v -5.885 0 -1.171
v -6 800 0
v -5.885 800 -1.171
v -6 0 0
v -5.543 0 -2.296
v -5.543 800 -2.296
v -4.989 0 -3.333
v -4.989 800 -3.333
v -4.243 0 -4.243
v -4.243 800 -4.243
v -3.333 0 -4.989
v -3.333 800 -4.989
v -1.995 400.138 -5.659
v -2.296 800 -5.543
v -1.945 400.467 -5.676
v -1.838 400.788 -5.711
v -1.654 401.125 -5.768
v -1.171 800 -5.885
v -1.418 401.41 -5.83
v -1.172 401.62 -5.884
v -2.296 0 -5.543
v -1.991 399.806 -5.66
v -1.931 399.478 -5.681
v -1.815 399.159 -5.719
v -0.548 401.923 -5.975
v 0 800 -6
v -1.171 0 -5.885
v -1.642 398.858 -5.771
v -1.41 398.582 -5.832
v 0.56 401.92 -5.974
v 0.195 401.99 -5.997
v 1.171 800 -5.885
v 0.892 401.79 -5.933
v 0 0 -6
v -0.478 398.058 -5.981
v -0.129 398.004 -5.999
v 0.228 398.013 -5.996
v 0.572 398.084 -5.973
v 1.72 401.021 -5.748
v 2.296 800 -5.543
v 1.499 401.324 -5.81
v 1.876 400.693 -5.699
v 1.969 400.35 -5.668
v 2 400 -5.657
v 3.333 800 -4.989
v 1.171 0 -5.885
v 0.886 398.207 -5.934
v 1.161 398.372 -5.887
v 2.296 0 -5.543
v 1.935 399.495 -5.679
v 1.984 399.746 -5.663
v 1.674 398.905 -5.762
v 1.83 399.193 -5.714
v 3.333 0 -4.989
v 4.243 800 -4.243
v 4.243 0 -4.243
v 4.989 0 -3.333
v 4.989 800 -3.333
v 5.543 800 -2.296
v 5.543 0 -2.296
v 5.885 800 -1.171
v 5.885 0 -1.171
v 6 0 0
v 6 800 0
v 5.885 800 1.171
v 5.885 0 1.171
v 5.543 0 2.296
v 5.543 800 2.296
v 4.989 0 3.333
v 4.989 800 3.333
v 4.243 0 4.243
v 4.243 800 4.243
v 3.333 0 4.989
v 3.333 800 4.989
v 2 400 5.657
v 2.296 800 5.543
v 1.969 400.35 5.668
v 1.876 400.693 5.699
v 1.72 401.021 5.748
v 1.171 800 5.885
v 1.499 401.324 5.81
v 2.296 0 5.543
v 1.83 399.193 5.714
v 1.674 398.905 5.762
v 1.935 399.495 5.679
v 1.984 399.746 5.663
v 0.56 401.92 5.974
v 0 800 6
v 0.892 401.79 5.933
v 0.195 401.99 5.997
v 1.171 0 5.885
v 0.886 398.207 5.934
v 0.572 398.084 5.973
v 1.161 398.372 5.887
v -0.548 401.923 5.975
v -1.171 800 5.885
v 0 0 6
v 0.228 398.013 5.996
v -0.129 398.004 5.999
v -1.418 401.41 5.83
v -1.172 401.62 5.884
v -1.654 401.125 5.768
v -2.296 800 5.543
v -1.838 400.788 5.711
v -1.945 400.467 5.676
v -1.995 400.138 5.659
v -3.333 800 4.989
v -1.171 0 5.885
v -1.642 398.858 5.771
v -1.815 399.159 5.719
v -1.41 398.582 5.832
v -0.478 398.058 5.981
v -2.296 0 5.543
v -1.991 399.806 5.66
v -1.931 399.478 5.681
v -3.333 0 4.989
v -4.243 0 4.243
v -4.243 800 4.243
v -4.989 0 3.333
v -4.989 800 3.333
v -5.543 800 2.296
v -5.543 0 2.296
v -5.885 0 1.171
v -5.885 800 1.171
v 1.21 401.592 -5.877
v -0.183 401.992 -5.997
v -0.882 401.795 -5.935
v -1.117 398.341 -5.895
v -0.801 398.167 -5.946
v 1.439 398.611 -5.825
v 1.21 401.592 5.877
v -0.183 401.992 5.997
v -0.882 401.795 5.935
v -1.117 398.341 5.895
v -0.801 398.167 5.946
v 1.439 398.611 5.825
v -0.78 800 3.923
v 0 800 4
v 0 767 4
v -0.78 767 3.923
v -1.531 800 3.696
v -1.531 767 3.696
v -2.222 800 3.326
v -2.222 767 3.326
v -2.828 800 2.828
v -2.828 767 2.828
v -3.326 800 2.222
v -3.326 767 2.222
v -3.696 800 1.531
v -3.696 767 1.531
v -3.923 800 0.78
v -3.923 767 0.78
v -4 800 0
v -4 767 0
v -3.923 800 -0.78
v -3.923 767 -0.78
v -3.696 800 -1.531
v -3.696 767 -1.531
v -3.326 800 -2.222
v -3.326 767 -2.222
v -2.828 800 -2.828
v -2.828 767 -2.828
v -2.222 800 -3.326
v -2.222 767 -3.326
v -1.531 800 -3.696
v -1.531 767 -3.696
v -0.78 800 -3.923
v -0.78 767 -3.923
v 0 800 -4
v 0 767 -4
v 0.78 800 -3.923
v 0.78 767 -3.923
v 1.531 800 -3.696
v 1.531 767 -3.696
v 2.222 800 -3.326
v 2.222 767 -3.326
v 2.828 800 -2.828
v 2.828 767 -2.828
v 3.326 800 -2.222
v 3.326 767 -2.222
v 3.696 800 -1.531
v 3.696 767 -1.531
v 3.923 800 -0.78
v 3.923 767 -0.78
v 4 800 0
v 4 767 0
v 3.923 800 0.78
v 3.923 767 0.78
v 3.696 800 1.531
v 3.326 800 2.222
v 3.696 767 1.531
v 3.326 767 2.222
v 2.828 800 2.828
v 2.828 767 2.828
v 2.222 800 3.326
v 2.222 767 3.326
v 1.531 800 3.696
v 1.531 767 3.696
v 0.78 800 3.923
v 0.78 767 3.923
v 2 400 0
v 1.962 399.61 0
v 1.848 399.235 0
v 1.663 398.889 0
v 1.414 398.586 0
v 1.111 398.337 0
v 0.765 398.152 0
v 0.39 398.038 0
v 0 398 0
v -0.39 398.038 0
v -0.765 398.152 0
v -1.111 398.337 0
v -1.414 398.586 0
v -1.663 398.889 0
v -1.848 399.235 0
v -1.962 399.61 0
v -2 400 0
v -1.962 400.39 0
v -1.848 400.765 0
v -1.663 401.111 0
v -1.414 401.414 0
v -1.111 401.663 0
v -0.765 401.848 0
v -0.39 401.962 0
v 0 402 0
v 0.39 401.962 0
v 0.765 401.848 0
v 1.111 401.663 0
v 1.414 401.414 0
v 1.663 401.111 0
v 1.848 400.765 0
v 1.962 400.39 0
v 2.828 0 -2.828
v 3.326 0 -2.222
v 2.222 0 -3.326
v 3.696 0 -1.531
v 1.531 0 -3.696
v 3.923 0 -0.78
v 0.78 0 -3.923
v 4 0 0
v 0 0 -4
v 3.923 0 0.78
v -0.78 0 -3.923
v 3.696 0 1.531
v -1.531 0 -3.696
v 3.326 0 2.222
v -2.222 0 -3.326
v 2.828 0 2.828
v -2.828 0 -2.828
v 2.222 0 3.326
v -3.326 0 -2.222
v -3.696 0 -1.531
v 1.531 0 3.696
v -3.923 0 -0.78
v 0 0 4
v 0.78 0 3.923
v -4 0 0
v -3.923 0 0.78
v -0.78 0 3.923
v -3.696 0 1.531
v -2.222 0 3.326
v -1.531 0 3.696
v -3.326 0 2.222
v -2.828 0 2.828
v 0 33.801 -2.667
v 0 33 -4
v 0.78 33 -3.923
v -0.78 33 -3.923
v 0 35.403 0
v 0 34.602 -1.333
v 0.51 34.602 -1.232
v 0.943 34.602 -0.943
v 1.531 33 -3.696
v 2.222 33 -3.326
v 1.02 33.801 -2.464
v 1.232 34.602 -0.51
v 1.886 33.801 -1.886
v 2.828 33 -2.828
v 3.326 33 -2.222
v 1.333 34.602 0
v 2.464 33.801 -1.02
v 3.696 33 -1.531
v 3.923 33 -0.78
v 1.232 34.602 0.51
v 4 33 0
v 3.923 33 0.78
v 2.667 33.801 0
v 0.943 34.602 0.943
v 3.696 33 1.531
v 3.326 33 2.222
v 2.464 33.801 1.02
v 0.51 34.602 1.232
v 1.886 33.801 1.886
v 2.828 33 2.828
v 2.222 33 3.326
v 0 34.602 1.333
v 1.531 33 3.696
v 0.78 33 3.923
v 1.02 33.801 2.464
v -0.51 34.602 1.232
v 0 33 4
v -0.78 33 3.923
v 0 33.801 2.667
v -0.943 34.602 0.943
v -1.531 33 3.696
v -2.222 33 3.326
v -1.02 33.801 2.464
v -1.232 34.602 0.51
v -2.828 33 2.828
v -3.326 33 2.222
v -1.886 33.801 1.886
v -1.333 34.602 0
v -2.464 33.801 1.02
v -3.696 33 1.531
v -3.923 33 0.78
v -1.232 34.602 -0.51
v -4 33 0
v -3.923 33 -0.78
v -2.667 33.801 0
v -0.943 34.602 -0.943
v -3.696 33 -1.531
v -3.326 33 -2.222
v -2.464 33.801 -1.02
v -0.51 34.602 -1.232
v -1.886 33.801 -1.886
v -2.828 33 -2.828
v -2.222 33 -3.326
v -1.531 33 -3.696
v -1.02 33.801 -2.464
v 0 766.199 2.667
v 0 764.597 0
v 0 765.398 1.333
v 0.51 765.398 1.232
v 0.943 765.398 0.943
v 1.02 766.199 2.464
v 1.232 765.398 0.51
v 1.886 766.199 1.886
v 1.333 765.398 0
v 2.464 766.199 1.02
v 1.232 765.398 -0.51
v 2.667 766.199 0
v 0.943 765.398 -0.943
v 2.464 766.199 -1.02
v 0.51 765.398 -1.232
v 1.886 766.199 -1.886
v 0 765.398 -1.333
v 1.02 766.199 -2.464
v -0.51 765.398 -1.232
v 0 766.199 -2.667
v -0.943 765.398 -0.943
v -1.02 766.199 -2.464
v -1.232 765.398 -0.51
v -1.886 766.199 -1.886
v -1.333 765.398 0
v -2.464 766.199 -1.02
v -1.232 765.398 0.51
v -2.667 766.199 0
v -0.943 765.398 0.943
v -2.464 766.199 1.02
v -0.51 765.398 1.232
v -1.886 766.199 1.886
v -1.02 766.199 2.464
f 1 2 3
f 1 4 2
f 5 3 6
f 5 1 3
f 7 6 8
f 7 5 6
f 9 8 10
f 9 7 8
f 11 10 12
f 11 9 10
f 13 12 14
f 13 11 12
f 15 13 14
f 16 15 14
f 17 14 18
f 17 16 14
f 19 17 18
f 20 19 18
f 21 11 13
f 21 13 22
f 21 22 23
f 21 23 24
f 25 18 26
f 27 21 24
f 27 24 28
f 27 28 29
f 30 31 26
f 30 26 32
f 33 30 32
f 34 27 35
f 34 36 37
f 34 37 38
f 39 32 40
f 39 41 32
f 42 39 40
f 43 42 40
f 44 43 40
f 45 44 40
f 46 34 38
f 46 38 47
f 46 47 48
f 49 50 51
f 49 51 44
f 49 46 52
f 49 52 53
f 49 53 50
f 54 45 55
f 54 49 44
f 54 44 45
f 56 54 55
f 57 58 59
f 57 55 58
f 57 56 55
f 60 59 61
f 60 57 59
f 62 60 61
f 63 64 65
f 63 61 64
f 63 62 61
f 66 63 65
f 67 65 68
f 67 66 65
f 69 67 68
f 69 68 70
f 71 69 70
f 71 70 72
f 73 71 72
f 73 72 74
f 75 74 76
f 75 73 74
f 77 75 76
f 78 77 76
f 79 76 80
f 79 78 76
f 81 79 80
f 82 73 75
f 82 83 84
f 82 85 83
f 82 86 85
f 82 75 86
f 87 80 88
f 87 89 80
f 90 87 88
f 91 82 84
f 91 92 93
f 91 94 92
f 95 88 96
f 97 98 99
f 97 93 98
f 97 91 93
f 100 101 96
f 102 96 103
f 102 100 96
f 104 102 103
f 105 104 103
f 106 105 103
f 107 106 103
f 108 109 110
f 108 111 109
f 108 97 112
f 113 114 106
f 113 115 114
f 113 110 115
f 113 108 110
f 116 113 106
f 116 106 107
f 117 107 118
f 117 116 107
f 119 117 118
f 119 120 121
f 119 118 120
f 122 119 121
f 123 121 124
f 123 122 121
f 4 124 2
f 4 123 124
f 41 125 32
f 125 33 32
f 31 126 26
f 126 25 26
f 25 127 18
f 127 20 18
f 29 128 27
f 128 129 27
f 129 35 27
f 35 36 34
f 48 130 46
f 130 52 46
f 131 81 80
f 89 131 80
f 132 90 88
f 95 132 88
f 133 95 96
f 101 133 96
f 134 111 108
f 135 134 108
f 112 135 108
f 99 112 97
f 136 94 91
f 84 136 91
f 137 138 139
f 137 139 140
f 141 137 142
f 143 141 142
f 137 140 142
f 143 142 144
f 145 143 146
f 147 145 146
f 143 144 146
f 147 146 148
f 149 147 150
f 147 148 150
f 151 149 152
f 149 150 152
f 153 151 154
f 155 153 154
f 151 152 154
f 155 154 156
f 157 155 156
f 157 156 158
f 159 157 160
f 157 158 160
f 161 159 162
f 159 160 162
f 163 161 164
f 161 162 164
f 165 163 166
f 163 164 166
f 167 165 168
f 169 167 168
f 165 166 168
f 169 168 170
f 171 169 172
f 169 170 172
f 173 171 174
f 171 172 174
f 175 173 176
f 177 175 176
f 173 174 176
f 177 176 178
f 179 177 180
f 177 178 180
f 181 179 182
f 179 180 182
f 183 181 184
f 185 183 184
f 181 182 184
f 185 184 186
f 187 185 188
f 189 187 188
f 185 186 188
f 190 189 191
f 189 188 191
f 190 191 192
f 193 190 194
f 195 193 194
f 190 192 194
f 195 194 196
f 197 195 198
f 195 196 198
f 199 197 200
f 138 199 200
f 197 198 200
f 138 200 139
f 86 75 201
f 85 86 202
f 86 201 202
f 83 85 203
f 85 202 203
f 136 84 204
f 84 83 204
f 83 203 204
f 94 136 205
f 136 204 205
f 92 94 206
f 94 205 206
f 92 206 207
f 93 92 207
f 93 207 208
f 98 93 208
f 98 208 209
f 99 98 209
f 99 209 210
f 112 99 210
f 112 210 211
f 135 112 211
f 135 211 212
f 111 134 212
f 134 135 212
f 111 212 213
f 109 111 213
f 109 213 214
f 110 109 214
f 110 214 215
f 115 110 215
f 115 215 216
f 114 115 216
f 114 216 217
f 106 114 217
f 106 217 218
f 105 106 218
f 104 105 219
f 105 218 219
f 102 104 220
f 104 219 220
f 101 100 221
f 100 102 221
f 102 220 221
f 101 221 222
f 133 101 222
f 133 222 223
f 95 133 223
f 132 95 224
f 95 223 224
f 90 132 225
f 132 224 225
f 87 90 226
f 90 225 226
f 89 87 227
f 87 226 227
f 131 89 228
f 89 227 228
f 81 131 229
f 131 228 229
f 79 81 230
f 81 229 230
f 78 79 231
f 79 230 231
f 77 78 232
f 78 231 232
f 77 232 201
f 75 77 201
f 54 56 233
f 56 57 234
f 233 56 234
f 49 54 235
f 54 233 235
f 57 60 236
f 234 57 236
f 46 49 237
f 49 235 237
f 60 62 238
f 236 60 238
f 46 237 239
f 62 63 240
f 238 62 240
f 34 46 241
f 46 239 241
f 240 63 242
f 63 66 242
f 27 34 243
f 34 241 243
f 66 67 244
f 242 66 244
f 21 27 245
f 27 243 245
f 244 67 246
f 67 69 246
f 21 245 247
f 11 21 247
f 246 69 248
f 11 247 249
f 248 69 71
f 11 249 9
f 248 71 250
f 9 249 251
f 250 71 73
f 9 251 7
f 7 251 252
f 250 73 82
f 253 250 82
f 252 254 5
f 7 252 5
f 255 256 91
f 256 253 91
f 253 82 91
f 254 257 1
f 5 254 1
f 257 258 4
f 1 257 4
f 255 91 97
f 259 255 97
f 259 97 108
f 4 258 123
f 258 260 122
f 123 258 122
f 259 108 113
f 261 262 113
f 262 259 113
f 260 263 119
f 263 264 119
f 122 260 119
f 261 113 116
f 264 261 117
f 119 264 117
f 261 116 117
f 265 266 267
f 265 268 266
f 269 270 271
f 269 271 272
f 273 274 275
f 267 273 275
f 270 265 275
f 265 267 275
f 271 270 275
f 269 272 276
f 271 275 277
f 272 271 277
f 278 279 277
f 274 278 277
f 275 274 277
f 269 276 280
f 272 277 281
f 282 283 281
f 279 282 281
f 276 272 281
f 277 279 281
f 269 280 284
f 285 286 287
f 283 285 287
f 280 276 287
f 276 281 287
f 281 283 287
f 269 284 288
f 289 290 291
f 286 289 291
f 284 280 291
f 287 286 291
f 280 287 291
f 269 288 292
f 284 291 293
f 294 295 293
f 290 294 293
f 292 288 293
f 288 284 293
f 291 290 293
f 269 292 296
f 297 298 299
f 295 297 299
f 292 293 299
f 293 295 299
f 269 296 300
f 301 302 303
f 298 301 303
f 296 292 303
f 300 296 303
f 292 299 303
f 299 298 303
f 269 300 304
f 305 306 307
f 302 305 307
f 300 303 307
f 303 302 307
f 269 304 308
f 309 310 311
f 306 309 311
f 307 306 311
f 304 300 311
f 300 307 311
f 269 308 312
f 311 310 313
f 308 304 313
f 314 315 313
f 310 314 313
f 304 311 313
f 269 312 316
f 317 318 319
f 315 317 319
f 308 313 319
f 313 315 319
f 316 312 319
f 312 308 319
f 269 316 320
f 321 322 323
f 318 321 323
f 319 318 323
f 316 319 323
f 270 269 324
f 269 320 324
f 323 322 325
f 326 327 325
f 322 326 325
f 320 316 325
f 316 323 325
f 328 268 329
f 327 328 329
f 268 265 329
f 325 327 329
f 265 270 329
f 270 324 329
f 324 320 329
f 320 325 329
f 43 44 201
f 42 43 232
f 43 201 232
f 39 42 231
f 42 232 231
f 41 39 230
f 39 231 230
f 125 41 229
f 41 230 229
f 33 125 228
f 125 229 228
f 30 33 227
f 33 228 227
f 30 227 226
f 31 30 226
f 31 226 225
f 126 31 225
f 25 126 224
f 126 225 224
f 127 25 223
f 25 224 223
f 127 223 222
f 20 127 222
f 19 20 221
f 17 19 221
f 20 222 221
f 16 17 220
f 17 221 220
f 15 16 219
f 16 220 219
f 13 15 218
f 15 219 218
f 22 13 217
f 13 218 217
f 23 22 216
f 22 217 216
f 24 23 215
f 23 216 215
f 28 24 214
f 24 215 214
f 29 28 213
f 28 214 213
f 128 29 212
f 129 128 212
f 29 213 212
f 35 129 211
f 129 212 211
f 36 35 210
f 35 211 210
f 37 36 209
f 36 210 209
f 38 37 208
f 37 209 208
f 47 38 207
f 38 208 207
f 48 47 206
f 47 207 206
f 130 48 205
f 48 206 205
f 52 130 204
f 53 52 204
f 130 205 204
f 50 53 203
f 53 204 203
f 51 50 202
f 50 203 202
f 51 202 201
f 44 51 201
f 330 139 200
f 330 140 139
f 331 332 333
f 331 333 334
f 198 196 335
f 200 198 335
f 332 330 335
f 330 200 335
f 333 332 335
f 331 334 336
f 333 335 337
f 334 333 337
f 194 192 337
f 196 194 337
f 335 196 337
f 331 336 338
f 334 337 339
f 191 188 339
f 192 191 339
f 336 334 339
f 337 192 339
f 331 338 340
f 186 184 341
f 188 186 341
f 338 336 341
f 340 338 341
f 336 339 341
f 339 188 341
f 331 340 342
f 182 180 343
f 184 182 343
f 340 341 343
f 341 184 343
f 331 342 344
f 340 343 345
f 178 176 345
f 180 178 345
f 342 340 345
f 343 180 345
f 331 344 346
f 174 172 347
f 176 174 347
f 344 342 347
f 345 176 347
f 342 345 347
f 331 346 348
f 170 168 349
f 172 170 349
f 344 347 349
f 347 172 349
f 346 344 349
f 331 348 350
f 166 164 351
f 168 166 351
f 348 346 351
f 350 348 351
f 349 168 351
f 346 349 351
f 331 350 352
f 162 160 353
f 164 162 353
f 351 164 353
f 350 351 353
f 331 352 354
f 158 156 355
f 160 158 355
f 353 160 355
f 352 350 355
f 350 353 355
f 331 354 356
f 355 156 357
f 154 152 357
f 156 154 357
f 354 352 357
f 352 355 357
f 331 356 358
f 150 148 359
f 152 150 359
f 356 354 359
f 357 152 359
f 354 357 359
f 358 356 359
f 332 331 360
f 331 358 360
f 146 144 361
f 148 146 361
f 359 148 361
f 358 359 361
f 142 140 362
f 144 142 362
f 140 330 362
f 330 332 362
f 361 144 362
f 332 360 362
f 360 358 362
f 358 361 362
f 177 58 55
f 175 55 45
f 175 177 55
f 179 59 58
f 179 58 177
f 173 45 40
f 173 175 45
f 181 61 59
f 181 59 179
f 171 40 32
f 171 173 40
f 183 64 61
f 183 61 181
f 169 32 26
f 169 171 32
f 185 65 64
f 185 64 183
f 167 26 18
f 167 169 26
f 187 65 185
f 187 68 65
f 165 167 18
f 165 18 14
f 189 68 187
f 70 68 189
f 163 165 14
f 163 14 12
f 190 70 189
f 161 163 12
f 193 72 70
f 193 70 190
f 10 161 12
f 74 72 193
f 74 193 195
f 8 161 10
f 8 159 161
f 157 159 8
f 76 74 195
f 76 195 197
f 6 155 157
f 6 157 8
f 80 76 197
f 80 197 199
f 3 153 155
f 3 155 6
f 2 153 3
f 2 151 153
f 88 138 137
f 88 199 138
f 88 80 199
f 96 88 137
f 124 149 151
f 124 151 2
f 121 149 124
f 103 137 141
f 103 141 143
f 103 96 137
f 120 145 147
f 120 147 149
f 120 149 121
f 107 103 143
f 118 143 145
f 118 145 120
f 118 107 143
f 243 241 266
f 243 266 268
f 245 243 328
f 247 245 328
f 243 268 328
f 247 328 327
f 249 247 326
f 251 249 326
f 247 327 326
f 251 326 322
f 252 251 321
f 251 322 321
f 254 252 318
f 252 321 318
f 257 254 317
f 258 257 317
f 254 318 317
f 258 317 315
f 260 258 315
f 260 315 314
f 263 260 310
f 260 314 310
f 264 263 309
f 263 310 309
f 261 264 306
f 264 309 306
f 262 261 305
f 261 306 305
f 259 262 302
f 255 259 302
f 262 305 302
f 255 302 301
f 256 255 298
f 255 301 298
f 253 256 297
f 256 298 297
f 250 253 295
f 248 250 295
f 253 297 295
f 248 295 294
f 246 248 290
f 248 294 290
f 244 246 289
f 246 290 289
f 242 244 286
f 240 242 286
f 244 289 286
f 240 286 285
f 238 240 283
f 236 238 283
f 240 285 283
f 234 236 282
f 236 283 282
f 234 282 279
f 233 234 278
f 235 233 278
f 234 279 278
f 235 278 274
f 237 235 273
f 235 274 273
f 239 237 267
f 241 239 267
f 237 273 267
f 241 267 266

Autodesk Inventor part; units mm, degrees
ref_plane "YZ Plane" through (0, 0, 0) normal (1, 0, 0) x (0, 1, 0)
ref_plane "XZ Plane" through (0, 0, 0) normal (0, 1, 0) x (-1, 0, 0)
ref_plane "XY Plane" through (0, 0, 0) normal (0, 0, 1) x (1, 0, 0)
sketch "Sketch1" plane through (0, 0, 0) normal (0, 1, 0) x (-1, 0, 0)
  circle A0 centre (0, 0) radius 6
  dimension "d0" = 12
extrude "Extrusion1" add sketch "Sketch1" along normal blind 800
sketch "Sketch2" plane through (0, 800, 0) normal (0, 1, 0) x (1, 0, 0)
  circle A0 centre (0, 0) radius 6 projected
hole "Hole1" at (0, 800, 0) direction (0, -1, 0) diameter 8 depth 33 tip angle 118
sketch "Sketch3" plane through (0, 0, 0) normal (0, -1, 0) x (1, 0, 0)
  circle A0 centre (0, 0) radius 6 projected
hole "Hole2" at (0, 0, 0) direction (0, 1, 0) diameter 8 depth 33 tip angle 118
sketch "Sketch5" plane through (0, 0, 0) normal (0, 0, 1) x (1, 0, 0)
  line L0 (-6, 0) -> (-6, 800) projected
  line L1 (6, 0) -> (6, 800) projected
  line L2 (-4, 800) -> (4, 800) projected
  line L3 (4, 0) -> (-4, 0) projected
  line L4 (0, 0) -> (0, 800)
  circle A0 centre (0, 400) radius 2
  dimension "d22" = 4
extrude "Extrusion3" cut sketch "Sketch5" against normal through all both and the other way through all
thread "Thread2" size "M4x0.7" class "6H" standard "ANSI Metric M Profile" full length
properties part number "lower arm 800"
